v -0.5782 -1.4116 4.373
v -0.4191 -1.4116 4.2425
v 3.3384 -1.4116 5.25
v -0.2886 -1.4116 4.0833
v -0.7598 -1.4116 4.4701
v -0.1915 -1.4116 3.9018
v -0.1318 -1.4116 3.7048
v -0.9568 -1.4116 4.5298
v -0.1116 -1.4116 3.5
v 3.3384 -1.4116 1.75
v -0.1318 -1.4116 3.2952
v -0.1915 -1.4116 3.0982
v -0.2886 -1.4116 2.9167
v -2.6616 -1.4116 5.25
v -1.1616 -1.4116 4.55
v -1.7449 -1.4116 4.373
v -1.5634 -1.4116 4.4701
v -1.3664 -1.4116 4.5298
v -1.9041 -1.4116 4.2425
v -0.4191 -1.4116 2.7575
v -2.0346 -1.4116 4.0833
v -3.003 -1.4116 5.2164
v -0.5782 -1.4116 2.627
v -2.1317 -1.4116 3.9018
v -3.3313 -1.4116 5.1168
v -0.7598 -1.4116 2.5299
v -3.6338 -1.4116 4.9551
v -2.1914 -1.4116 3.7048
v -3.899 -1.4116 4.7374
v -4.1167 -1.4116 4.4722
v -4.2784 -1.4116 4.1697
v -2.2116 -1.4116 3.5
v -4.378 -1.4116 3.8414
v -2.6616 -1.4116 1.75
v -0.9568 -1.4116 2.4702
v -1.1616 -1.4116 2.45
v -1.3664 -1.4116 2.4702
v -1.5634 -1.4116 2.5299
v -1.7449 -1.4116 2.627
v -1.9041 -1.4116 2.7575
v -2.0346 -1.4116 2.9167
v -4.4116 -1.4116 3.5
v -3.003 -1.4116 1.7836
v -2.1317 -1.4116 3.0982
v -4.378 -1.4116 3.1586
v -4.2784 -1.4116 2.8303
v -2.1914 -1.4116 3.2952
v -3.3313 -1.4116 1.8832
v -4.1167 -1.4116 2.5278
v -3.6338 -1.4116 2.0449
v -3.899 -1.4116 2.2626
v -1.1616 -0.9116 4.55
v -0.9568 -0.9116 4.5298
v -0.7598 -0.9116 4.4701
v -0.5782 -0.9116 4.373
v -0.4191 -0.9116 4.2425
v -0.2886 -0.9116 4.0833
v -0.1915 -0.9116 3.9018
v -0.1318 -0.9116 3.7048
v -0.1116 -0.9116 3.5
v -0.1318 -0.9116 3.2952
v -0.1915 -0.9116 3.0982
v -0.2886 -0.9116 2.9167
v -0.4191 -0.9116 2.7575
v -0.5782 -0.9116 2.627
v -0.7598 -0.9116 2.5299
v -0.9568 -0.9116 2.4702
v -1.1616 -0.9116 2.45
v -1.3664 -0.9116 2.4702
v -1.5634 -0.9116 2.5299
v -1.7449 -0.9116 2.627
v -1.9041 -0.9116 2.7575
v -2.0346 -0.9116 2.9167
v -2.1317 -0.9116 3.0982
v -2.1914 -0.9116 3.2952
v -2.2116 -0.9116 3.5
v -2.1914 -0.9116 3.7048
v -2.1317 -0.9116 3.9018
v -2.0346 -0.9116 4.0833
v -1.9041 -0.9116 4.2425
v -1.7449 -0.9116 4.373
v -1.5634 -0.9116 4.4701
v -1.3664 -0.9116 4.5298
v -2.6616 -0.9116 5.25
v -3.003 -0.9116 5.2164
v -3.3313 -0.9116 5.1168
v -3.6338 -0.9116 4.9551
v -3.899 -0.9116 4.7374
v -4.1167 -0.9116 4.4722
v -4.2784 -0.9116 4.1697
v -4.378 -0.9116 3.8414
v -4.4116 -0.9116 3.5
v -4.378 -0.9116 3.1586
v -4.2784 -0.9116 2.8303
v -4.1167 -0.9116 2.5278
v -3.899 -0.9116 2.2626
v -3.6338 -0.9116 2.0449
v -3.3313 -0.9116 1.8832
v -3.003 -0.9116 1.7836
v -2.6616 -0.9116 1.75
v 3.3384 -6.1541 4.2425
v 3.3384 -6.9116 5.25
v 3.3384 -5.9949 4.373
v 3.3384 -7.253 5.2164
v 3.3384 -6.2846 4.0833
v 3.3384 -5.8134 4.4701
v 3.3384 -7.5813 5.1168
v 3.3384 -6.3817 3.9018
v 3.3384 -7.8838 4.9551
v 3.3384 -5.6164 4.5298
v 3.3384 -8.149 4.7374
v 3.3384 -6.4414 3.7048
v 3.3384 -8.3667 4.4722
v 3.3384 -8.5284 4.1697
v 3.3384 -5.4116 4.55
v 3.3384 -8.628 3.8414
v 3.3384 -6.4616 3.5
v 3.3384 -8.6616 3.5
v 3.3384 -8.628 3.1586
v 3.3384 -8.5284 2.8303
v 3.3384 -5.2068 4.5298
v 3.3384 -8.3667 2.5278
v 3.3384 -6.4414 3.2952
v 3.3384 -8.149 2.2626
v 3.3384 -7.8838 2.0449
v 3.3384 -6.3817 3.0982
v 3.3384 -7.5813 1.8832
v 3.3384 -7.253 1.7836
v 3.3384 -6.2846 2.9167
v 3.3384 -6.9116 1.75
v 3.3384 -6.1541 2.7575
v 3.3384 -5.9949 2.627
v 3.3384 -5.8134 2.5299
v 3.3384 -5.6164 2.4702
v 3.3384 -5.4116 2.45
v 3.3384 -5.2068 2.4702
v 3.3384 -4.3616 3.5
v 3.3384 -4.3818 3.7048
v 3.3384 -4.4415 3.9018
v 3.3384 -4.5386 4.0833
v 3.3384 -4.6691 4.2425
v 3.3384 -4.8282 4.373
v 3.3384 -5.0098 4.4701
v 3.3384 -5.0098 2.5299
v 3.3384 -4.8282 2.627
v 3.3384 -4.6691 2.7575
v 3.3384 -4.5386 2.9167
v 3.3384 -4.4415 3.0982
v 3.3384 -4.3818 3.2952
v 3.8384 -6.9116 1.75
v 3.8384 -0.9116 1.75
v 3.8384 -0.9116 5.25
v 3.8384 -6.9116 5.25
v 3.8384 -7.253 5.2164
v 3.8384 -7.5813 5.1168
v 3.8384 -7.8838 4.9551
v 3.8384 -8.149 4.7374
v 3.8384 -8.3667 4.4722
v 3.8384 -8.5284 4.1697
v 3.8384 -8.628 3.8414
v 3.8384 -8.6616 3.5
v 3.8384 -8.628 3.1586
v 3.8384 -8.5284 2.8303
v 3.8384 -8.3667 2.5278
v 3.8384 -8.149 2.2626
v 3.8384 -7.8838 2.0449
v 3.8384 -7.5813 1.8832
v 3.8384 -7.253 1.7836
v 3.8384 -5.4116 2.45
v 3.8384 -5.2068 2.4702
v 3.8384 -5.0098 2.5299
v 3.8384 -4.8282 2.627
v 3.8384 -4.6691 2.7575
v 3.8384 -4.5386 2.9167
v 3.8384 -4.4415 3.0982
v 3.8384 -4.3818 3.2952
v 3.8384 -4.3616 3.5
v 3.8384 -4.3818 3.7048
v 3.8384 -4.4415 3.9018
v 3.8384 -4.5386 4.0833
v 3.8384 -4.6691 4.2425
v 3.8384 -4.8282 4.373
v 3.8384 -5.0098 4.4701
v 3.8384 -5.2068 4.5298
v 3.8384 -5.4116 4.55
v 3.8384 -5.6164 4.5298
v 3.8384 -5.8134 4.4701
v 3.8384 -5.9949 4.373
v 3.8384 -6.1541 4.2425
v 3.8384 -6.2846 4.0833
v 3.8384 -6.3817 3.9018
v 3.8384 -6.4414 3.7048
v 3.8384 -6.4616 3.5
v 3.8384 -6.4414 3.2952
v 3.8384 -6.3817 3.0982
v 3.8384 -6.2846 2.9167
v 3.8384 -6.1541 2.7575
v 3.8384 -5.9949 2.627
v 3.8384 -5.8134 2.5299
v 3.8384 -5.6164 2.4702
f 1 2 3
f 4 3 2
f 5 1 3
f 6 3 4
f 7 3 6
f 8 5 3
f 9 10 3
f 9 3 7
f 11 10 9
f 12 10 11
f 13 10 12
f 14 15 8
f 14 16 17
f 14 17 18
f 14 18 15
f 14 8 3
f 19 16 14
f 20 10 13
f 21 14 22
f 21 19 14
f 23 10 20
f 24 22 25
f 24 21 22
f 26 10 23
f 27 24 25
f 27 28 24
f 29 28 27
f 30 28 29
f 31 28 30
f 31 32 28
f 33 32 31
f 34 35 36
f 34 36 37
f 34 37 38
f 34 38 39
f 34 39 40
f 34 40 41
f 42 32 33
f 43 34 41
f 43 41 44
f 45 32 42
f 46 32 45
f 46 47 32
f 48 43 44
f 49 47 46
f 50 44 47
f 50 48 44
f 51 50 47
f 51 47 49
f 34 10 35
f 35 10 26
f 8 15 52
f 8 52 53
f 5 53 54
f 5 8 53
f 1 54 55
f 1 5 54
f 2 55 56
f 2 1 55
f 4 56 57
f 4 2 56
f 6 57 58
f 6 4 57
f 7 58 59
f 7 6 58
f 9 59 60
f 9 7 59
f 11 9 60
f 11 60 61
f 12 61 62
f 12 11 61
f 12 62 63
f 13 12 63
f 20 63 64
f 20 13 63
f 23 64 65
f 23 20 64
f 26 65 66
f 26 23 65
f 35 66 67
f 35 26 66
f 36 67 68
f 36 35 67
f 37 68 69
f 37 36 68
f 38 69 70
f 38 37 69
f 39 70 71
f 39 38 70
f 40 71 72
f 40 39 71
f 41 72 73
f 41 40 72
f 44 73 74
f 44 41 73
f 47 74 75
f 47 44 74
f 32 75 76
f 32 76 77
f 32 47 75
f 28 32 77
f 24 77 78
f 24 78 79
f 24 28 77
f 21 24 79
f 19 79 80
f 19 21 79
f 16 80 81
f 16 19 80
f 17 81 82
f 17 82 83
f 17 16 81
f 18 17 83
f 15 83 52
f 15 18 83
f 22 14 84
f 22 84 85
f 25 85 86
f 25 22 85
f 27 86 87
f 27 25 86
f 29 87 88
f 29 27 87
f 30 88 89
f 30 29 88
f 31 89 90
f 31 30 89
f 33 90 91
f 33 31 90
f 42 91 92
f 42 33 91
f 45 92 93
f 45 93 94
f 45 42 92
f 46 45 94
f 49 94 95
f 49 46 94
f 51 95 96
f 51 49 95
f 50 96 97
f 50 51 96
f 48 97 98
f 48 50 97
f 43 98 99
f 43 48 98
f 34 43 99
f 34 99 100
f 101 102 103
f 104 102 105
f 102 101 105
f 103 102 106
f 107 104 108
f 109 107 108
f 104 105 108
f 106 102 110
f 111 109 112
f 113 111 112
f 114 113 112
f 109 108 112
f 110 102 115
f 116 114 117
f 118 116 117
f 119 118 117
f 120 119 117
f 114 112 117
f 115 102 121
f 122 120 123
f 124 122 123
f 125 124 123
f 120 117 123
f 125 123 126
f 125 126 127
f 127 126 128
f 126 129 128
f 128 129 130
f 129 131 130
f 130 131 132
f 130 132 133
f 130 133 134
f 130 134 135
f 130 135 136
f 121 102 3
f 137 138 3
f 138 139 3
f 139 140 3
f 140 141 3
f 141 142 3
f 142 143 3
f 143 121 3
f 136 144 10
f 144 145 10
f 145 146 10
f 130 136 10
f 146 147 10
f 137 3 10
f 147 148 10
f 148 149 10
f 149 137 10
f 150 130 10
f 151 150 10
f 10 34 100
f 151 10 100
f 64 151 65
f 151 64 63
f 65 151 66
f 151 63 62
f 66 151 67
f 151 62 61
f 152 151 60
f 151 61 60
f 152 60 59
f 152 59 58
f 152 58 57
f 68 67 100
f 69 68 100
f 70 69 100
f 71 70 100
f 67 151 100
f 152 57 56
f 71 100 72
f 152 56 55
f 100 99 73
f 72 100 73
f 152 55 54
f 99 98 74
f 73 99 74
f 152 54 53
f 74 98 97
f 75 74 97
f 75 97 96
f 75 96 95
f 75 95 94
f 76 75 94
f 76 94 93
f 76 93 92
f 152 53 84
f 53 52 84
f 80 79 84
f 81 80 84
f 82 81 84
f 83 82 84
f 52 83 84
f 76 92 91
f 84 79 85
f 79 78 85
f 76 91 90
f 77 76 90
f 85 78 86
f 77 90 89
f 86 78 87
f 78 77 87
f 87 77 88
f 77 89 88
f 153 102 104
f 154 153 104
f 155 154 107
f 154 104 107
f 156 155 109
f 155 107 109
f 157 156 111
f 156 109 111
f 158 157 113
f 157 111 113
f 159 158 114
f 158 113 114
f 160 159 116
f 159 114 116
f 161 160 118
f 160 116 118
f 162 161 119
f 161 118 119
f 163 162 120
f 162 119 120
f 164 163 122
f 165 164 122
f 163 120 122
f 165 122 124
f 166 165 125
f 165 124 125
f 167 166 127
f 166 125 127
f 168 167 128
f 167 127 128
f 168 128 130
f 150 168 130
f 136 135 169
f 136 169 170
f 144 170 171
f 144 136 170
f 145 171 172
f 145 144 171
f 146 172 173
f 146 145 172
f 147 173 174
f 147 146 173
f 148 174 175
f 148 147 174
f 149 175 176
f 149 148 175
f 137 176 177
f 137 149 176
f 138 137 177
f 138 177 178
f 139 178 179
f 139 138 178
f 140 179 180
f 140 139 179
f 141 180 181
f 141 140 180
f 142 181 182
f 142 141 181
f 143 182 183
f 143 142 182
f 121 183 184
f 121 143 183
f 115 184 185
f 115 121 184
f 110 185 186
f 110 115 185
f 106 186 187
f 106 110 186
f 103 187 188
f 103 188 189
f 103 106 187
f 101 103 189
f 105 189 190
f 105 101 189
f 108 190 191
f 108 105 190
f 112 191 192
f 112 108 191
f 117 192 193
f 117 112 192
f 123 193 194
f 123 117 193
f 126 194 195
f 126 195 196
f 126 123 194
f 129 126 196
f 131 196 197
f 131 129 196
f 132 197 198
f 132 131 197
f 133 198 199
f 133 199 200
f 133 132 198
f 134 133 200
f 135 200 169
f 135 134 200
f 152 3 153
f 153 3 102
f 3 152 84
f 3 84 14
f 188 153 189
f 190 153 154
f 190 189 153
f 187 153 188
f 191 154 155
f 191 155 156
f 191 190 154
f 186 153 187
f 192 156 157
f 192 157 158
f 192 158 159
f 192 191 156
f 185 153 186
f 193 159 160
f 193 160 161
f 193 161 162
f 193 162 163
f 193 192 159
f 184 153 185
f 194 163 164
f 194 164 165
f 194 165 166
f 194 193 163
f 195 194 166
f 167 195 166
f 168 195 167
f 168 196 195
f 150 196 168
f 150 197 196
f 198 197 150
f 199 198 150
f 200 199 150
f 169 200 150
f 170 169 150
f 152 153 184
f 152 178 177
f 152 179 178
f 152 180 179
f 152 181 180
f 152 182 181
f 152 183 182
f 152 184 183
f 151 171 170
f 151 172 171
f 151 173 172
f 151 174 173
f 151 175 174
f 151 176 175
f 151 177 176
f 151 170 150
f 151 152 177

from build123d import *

# Parameters (mm, degrees)
SKETCH_1_R      = 2.1
EXTRUDE_1_DEPTH = 1
SKETCH_2_R      = 2.1
EXTRUDE_2_DEPTH = 1
SCALE_2_SCALE   = 0.5
SCALE_1_SCALE   = 0.5
SCALE_3_SCALE   = 2


with BuildPart() as part:
    # Эскиз1 → Бобышка-Вытянуть1 (new body)
    with BuildSketch(Plane(origin=(0, 0, 0), x_dir=(1, 0, 0), z_dir=(0, 1, 0))):
        with BuildLine():
            Line((0, -7), (-7, -7))
            ThreePointArc((-7, -7), (-10.5, -3.5), (-7, 0))
            Line((-7, 0), (0, 0))
            Line((0, 0), (5, 0))
            Line((5, 0), (5, -7))
            Line((5, -7), (0, -7))
        make_face()
        with Locations(Location((-4, -3.5, 0), (0, 0, 270))):
            Circle(SKETCH_1_R, mode=Mode.SUBTRACT)
    extrude(amount=EXTRUDE_1_DEPTH)

    # Эскиз2 → Бобышка-Вытянуть2 (add)
    with BuildSketch(Plane(origin=(5, 0, 0), x_dir=(0, 0, -1), z_dir=(1, 0, 0))):
        with BuildLine():
            Line((0, -11), (0, 1))
            Line((0, 1), (-7, 1))
            Line((-7, 1), (-7, -11))
            ThreePointArc((-7, -11), (-3.5, -14.5), (0, -11))
        make_face()
        with Locations((-3.5, -8)):
            Circle(SKETCH_2_R, mode=Mode.SUBTRACT)
    extrude(amount=EXTRUDE_2_DEPTH)


with BuildPart() as part_1:
    # Масштаб2: scaled about (1.676803453, -2.823196547, 3.5)
    add(part.part.scale(SCALE_2_SCALE).moved(Location((0.838401726, -1.411598273, 1.75))))


with BuildPart() as part_2:
    # Масштаб1: scaled about (1.676803453, -2.823196547, 3.5)
    add(part_1.part.scale(SCALE_1_SCALE).moved(Location((0.838401726, -1.411598273, 1.75))))


with BuildPart() as part_3:
    # Масштаб3: scaled about (1.676803453, -2.823196547, 3.5)
    add(part_2.part.scale(SCALE_3_SCALE).moved(Location((-1.676803453, 2.823196547, -3.5))))


solid = part_3.part
